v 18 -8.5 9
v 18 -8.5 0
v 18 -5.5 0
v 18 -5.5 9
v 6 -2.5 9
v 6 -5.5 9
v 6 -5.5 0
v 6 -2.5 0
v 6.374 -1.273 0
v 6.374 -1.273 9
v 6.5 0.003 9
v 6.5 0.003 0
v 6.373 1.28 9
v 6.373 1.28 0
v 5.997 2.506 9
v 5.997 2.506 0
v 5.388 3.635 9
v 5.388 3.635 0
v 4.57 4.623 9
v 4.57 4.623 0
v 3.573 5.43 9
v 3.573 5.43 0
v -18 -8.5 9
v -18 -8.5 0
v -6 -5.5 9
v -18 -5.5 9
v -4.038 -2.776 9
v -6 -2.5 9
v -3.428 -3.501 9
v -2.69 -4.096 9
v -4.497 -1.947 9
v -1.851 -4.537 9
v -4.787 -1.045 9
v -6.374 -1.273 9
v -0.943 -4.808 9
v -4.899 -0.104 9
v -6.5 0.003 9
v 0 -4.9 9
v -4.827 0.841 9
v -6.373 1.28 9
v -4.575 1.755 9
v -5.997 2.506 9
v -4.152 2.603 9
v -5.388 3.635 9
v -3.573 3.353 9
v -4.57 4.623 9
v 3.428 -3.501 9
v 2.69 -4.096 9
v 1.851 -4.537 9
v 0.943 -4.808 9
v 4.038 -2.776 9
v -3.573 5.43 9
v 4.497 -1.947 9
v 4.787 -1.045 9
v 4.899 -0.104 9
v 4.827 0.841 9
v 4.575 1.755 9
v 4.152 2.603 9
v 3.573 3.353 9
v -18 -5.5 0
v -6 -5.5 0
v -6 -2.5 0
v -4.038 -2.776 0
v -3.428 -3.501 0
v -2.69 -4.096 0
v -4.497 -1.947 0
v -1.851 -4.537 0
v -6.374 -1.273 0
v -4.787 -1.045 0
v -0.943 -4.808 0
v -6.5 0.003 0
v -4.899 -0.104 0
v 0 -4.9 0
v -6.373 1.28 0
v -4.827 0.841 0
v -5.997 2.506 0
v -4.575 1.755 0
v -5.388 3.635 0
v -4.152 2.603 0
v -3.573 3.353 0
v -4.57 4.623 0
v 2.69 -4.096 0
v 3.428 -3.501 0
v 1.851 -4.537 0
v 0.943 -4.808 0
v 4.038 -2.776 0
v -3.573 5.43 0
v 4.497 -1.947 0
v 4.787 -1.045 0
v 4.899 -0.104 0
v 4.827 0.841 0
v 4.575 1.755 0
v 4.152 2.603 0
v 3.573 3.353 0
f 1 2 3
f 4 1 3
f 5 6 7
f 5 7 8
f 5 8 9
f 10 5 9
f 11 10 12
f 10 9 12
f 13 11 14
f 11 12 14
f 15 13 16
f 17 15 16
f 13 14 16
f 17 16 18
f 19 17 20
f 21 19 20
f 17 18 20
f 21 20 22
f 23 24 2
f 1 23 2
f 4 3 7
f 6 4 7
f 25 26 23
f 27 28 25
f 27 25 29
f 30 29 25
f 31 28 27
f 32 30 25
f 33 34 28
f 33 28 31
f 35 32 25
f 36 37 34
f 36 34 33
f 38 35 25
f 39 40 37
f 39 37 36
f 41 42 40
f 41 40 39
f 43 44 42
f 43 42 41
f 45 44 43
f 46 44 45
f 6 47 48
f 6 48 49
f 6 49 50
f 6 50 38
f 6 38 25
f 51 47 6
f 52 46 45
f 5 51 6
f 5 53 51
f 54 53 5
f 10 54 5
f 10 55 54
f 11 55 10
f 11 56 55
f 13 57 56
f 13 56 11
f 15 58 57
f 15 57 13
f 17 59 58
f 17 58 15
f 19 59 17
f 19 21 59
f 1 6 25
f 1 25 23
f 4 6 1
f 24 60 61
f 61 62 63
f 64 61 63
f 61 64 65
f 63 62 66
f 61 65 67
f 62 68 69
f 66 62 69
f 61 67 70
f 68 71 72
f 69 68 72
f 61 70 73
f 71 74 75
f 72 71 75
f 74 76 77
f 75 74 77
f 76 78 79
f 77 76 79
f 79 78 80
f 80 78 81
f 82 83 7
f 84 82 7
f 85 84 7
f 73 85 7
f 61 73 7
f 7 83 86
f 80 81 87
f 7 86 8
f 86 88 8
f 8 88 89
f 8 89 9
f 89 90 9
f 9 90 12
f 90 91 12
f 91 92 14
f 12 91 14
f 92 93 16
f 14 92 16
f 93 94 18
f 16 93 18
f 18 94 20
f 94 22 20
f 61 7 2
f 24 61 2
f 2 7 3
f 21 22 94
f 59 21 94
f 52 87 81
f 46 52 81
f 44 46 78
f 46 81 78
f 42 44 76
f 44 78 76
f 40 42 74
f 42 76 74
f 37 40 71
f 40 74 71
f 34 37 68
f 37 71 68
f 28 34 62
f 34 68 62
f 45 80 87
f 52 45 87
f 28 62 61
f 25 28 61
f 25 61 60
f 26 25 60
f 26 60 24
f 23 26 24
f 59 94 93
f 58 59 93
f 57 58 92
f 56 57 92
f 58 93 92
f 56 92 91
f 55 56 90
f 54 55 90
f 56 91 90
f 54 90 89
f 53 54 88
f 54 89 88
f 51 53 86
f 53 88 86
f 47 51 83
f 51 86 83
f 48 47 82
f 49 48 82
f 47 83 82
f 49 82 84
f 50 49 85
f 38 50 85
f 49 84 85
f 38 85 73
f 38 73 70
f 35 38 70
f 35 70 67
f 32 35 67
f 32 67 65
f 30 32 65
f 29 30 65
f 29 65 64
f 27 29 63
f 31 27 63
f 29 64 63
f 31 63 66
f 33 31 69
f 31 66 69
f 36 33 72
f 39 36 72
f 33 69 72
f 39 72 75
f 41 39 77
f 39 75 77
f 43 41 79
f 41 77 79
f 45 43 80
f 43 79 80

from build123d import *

# Parameters (mm, degrees)
F1_DEPTH = 9


with BuildPart() as f1:
    # F0 (on Top) → F1 (new body)
    with BuildSketch(Plane.XY):
        with BuildLine():
            Line((-3.572917, 3.353247), (-3.572917, 5.429942))
            ThreePointArc((-3.572917, 5.429942), (-6.215398, 1.90232), (-6, -2.5))
            Line((-6, -2.5), (-6, -5.5))
            Line((-6, -5.5), (-18, -5.5))
            Line((-18, -5.5), (-18, -8.5))
            Line((-18, -8.5), (18, -8.5))
            Line((18, -8.5), (18, -5.5))
            Line((18, -5.5), (6, -5.5))
            Line((6, -5.5), (6, -2.5))
            ThreePointArc((6, -2.5), (6.215398, 1.90232), (3.572917, 5.429942))
            Line((3.572917, 5.429942), (3.572917, 3.353247))
            ThreePointArc((3.572917, 3.353247), (0, -4.9), (-3.572917, 3.353247))
        make_face()
    extrude(amount=F1_DEPTH)


solid = f1.part
